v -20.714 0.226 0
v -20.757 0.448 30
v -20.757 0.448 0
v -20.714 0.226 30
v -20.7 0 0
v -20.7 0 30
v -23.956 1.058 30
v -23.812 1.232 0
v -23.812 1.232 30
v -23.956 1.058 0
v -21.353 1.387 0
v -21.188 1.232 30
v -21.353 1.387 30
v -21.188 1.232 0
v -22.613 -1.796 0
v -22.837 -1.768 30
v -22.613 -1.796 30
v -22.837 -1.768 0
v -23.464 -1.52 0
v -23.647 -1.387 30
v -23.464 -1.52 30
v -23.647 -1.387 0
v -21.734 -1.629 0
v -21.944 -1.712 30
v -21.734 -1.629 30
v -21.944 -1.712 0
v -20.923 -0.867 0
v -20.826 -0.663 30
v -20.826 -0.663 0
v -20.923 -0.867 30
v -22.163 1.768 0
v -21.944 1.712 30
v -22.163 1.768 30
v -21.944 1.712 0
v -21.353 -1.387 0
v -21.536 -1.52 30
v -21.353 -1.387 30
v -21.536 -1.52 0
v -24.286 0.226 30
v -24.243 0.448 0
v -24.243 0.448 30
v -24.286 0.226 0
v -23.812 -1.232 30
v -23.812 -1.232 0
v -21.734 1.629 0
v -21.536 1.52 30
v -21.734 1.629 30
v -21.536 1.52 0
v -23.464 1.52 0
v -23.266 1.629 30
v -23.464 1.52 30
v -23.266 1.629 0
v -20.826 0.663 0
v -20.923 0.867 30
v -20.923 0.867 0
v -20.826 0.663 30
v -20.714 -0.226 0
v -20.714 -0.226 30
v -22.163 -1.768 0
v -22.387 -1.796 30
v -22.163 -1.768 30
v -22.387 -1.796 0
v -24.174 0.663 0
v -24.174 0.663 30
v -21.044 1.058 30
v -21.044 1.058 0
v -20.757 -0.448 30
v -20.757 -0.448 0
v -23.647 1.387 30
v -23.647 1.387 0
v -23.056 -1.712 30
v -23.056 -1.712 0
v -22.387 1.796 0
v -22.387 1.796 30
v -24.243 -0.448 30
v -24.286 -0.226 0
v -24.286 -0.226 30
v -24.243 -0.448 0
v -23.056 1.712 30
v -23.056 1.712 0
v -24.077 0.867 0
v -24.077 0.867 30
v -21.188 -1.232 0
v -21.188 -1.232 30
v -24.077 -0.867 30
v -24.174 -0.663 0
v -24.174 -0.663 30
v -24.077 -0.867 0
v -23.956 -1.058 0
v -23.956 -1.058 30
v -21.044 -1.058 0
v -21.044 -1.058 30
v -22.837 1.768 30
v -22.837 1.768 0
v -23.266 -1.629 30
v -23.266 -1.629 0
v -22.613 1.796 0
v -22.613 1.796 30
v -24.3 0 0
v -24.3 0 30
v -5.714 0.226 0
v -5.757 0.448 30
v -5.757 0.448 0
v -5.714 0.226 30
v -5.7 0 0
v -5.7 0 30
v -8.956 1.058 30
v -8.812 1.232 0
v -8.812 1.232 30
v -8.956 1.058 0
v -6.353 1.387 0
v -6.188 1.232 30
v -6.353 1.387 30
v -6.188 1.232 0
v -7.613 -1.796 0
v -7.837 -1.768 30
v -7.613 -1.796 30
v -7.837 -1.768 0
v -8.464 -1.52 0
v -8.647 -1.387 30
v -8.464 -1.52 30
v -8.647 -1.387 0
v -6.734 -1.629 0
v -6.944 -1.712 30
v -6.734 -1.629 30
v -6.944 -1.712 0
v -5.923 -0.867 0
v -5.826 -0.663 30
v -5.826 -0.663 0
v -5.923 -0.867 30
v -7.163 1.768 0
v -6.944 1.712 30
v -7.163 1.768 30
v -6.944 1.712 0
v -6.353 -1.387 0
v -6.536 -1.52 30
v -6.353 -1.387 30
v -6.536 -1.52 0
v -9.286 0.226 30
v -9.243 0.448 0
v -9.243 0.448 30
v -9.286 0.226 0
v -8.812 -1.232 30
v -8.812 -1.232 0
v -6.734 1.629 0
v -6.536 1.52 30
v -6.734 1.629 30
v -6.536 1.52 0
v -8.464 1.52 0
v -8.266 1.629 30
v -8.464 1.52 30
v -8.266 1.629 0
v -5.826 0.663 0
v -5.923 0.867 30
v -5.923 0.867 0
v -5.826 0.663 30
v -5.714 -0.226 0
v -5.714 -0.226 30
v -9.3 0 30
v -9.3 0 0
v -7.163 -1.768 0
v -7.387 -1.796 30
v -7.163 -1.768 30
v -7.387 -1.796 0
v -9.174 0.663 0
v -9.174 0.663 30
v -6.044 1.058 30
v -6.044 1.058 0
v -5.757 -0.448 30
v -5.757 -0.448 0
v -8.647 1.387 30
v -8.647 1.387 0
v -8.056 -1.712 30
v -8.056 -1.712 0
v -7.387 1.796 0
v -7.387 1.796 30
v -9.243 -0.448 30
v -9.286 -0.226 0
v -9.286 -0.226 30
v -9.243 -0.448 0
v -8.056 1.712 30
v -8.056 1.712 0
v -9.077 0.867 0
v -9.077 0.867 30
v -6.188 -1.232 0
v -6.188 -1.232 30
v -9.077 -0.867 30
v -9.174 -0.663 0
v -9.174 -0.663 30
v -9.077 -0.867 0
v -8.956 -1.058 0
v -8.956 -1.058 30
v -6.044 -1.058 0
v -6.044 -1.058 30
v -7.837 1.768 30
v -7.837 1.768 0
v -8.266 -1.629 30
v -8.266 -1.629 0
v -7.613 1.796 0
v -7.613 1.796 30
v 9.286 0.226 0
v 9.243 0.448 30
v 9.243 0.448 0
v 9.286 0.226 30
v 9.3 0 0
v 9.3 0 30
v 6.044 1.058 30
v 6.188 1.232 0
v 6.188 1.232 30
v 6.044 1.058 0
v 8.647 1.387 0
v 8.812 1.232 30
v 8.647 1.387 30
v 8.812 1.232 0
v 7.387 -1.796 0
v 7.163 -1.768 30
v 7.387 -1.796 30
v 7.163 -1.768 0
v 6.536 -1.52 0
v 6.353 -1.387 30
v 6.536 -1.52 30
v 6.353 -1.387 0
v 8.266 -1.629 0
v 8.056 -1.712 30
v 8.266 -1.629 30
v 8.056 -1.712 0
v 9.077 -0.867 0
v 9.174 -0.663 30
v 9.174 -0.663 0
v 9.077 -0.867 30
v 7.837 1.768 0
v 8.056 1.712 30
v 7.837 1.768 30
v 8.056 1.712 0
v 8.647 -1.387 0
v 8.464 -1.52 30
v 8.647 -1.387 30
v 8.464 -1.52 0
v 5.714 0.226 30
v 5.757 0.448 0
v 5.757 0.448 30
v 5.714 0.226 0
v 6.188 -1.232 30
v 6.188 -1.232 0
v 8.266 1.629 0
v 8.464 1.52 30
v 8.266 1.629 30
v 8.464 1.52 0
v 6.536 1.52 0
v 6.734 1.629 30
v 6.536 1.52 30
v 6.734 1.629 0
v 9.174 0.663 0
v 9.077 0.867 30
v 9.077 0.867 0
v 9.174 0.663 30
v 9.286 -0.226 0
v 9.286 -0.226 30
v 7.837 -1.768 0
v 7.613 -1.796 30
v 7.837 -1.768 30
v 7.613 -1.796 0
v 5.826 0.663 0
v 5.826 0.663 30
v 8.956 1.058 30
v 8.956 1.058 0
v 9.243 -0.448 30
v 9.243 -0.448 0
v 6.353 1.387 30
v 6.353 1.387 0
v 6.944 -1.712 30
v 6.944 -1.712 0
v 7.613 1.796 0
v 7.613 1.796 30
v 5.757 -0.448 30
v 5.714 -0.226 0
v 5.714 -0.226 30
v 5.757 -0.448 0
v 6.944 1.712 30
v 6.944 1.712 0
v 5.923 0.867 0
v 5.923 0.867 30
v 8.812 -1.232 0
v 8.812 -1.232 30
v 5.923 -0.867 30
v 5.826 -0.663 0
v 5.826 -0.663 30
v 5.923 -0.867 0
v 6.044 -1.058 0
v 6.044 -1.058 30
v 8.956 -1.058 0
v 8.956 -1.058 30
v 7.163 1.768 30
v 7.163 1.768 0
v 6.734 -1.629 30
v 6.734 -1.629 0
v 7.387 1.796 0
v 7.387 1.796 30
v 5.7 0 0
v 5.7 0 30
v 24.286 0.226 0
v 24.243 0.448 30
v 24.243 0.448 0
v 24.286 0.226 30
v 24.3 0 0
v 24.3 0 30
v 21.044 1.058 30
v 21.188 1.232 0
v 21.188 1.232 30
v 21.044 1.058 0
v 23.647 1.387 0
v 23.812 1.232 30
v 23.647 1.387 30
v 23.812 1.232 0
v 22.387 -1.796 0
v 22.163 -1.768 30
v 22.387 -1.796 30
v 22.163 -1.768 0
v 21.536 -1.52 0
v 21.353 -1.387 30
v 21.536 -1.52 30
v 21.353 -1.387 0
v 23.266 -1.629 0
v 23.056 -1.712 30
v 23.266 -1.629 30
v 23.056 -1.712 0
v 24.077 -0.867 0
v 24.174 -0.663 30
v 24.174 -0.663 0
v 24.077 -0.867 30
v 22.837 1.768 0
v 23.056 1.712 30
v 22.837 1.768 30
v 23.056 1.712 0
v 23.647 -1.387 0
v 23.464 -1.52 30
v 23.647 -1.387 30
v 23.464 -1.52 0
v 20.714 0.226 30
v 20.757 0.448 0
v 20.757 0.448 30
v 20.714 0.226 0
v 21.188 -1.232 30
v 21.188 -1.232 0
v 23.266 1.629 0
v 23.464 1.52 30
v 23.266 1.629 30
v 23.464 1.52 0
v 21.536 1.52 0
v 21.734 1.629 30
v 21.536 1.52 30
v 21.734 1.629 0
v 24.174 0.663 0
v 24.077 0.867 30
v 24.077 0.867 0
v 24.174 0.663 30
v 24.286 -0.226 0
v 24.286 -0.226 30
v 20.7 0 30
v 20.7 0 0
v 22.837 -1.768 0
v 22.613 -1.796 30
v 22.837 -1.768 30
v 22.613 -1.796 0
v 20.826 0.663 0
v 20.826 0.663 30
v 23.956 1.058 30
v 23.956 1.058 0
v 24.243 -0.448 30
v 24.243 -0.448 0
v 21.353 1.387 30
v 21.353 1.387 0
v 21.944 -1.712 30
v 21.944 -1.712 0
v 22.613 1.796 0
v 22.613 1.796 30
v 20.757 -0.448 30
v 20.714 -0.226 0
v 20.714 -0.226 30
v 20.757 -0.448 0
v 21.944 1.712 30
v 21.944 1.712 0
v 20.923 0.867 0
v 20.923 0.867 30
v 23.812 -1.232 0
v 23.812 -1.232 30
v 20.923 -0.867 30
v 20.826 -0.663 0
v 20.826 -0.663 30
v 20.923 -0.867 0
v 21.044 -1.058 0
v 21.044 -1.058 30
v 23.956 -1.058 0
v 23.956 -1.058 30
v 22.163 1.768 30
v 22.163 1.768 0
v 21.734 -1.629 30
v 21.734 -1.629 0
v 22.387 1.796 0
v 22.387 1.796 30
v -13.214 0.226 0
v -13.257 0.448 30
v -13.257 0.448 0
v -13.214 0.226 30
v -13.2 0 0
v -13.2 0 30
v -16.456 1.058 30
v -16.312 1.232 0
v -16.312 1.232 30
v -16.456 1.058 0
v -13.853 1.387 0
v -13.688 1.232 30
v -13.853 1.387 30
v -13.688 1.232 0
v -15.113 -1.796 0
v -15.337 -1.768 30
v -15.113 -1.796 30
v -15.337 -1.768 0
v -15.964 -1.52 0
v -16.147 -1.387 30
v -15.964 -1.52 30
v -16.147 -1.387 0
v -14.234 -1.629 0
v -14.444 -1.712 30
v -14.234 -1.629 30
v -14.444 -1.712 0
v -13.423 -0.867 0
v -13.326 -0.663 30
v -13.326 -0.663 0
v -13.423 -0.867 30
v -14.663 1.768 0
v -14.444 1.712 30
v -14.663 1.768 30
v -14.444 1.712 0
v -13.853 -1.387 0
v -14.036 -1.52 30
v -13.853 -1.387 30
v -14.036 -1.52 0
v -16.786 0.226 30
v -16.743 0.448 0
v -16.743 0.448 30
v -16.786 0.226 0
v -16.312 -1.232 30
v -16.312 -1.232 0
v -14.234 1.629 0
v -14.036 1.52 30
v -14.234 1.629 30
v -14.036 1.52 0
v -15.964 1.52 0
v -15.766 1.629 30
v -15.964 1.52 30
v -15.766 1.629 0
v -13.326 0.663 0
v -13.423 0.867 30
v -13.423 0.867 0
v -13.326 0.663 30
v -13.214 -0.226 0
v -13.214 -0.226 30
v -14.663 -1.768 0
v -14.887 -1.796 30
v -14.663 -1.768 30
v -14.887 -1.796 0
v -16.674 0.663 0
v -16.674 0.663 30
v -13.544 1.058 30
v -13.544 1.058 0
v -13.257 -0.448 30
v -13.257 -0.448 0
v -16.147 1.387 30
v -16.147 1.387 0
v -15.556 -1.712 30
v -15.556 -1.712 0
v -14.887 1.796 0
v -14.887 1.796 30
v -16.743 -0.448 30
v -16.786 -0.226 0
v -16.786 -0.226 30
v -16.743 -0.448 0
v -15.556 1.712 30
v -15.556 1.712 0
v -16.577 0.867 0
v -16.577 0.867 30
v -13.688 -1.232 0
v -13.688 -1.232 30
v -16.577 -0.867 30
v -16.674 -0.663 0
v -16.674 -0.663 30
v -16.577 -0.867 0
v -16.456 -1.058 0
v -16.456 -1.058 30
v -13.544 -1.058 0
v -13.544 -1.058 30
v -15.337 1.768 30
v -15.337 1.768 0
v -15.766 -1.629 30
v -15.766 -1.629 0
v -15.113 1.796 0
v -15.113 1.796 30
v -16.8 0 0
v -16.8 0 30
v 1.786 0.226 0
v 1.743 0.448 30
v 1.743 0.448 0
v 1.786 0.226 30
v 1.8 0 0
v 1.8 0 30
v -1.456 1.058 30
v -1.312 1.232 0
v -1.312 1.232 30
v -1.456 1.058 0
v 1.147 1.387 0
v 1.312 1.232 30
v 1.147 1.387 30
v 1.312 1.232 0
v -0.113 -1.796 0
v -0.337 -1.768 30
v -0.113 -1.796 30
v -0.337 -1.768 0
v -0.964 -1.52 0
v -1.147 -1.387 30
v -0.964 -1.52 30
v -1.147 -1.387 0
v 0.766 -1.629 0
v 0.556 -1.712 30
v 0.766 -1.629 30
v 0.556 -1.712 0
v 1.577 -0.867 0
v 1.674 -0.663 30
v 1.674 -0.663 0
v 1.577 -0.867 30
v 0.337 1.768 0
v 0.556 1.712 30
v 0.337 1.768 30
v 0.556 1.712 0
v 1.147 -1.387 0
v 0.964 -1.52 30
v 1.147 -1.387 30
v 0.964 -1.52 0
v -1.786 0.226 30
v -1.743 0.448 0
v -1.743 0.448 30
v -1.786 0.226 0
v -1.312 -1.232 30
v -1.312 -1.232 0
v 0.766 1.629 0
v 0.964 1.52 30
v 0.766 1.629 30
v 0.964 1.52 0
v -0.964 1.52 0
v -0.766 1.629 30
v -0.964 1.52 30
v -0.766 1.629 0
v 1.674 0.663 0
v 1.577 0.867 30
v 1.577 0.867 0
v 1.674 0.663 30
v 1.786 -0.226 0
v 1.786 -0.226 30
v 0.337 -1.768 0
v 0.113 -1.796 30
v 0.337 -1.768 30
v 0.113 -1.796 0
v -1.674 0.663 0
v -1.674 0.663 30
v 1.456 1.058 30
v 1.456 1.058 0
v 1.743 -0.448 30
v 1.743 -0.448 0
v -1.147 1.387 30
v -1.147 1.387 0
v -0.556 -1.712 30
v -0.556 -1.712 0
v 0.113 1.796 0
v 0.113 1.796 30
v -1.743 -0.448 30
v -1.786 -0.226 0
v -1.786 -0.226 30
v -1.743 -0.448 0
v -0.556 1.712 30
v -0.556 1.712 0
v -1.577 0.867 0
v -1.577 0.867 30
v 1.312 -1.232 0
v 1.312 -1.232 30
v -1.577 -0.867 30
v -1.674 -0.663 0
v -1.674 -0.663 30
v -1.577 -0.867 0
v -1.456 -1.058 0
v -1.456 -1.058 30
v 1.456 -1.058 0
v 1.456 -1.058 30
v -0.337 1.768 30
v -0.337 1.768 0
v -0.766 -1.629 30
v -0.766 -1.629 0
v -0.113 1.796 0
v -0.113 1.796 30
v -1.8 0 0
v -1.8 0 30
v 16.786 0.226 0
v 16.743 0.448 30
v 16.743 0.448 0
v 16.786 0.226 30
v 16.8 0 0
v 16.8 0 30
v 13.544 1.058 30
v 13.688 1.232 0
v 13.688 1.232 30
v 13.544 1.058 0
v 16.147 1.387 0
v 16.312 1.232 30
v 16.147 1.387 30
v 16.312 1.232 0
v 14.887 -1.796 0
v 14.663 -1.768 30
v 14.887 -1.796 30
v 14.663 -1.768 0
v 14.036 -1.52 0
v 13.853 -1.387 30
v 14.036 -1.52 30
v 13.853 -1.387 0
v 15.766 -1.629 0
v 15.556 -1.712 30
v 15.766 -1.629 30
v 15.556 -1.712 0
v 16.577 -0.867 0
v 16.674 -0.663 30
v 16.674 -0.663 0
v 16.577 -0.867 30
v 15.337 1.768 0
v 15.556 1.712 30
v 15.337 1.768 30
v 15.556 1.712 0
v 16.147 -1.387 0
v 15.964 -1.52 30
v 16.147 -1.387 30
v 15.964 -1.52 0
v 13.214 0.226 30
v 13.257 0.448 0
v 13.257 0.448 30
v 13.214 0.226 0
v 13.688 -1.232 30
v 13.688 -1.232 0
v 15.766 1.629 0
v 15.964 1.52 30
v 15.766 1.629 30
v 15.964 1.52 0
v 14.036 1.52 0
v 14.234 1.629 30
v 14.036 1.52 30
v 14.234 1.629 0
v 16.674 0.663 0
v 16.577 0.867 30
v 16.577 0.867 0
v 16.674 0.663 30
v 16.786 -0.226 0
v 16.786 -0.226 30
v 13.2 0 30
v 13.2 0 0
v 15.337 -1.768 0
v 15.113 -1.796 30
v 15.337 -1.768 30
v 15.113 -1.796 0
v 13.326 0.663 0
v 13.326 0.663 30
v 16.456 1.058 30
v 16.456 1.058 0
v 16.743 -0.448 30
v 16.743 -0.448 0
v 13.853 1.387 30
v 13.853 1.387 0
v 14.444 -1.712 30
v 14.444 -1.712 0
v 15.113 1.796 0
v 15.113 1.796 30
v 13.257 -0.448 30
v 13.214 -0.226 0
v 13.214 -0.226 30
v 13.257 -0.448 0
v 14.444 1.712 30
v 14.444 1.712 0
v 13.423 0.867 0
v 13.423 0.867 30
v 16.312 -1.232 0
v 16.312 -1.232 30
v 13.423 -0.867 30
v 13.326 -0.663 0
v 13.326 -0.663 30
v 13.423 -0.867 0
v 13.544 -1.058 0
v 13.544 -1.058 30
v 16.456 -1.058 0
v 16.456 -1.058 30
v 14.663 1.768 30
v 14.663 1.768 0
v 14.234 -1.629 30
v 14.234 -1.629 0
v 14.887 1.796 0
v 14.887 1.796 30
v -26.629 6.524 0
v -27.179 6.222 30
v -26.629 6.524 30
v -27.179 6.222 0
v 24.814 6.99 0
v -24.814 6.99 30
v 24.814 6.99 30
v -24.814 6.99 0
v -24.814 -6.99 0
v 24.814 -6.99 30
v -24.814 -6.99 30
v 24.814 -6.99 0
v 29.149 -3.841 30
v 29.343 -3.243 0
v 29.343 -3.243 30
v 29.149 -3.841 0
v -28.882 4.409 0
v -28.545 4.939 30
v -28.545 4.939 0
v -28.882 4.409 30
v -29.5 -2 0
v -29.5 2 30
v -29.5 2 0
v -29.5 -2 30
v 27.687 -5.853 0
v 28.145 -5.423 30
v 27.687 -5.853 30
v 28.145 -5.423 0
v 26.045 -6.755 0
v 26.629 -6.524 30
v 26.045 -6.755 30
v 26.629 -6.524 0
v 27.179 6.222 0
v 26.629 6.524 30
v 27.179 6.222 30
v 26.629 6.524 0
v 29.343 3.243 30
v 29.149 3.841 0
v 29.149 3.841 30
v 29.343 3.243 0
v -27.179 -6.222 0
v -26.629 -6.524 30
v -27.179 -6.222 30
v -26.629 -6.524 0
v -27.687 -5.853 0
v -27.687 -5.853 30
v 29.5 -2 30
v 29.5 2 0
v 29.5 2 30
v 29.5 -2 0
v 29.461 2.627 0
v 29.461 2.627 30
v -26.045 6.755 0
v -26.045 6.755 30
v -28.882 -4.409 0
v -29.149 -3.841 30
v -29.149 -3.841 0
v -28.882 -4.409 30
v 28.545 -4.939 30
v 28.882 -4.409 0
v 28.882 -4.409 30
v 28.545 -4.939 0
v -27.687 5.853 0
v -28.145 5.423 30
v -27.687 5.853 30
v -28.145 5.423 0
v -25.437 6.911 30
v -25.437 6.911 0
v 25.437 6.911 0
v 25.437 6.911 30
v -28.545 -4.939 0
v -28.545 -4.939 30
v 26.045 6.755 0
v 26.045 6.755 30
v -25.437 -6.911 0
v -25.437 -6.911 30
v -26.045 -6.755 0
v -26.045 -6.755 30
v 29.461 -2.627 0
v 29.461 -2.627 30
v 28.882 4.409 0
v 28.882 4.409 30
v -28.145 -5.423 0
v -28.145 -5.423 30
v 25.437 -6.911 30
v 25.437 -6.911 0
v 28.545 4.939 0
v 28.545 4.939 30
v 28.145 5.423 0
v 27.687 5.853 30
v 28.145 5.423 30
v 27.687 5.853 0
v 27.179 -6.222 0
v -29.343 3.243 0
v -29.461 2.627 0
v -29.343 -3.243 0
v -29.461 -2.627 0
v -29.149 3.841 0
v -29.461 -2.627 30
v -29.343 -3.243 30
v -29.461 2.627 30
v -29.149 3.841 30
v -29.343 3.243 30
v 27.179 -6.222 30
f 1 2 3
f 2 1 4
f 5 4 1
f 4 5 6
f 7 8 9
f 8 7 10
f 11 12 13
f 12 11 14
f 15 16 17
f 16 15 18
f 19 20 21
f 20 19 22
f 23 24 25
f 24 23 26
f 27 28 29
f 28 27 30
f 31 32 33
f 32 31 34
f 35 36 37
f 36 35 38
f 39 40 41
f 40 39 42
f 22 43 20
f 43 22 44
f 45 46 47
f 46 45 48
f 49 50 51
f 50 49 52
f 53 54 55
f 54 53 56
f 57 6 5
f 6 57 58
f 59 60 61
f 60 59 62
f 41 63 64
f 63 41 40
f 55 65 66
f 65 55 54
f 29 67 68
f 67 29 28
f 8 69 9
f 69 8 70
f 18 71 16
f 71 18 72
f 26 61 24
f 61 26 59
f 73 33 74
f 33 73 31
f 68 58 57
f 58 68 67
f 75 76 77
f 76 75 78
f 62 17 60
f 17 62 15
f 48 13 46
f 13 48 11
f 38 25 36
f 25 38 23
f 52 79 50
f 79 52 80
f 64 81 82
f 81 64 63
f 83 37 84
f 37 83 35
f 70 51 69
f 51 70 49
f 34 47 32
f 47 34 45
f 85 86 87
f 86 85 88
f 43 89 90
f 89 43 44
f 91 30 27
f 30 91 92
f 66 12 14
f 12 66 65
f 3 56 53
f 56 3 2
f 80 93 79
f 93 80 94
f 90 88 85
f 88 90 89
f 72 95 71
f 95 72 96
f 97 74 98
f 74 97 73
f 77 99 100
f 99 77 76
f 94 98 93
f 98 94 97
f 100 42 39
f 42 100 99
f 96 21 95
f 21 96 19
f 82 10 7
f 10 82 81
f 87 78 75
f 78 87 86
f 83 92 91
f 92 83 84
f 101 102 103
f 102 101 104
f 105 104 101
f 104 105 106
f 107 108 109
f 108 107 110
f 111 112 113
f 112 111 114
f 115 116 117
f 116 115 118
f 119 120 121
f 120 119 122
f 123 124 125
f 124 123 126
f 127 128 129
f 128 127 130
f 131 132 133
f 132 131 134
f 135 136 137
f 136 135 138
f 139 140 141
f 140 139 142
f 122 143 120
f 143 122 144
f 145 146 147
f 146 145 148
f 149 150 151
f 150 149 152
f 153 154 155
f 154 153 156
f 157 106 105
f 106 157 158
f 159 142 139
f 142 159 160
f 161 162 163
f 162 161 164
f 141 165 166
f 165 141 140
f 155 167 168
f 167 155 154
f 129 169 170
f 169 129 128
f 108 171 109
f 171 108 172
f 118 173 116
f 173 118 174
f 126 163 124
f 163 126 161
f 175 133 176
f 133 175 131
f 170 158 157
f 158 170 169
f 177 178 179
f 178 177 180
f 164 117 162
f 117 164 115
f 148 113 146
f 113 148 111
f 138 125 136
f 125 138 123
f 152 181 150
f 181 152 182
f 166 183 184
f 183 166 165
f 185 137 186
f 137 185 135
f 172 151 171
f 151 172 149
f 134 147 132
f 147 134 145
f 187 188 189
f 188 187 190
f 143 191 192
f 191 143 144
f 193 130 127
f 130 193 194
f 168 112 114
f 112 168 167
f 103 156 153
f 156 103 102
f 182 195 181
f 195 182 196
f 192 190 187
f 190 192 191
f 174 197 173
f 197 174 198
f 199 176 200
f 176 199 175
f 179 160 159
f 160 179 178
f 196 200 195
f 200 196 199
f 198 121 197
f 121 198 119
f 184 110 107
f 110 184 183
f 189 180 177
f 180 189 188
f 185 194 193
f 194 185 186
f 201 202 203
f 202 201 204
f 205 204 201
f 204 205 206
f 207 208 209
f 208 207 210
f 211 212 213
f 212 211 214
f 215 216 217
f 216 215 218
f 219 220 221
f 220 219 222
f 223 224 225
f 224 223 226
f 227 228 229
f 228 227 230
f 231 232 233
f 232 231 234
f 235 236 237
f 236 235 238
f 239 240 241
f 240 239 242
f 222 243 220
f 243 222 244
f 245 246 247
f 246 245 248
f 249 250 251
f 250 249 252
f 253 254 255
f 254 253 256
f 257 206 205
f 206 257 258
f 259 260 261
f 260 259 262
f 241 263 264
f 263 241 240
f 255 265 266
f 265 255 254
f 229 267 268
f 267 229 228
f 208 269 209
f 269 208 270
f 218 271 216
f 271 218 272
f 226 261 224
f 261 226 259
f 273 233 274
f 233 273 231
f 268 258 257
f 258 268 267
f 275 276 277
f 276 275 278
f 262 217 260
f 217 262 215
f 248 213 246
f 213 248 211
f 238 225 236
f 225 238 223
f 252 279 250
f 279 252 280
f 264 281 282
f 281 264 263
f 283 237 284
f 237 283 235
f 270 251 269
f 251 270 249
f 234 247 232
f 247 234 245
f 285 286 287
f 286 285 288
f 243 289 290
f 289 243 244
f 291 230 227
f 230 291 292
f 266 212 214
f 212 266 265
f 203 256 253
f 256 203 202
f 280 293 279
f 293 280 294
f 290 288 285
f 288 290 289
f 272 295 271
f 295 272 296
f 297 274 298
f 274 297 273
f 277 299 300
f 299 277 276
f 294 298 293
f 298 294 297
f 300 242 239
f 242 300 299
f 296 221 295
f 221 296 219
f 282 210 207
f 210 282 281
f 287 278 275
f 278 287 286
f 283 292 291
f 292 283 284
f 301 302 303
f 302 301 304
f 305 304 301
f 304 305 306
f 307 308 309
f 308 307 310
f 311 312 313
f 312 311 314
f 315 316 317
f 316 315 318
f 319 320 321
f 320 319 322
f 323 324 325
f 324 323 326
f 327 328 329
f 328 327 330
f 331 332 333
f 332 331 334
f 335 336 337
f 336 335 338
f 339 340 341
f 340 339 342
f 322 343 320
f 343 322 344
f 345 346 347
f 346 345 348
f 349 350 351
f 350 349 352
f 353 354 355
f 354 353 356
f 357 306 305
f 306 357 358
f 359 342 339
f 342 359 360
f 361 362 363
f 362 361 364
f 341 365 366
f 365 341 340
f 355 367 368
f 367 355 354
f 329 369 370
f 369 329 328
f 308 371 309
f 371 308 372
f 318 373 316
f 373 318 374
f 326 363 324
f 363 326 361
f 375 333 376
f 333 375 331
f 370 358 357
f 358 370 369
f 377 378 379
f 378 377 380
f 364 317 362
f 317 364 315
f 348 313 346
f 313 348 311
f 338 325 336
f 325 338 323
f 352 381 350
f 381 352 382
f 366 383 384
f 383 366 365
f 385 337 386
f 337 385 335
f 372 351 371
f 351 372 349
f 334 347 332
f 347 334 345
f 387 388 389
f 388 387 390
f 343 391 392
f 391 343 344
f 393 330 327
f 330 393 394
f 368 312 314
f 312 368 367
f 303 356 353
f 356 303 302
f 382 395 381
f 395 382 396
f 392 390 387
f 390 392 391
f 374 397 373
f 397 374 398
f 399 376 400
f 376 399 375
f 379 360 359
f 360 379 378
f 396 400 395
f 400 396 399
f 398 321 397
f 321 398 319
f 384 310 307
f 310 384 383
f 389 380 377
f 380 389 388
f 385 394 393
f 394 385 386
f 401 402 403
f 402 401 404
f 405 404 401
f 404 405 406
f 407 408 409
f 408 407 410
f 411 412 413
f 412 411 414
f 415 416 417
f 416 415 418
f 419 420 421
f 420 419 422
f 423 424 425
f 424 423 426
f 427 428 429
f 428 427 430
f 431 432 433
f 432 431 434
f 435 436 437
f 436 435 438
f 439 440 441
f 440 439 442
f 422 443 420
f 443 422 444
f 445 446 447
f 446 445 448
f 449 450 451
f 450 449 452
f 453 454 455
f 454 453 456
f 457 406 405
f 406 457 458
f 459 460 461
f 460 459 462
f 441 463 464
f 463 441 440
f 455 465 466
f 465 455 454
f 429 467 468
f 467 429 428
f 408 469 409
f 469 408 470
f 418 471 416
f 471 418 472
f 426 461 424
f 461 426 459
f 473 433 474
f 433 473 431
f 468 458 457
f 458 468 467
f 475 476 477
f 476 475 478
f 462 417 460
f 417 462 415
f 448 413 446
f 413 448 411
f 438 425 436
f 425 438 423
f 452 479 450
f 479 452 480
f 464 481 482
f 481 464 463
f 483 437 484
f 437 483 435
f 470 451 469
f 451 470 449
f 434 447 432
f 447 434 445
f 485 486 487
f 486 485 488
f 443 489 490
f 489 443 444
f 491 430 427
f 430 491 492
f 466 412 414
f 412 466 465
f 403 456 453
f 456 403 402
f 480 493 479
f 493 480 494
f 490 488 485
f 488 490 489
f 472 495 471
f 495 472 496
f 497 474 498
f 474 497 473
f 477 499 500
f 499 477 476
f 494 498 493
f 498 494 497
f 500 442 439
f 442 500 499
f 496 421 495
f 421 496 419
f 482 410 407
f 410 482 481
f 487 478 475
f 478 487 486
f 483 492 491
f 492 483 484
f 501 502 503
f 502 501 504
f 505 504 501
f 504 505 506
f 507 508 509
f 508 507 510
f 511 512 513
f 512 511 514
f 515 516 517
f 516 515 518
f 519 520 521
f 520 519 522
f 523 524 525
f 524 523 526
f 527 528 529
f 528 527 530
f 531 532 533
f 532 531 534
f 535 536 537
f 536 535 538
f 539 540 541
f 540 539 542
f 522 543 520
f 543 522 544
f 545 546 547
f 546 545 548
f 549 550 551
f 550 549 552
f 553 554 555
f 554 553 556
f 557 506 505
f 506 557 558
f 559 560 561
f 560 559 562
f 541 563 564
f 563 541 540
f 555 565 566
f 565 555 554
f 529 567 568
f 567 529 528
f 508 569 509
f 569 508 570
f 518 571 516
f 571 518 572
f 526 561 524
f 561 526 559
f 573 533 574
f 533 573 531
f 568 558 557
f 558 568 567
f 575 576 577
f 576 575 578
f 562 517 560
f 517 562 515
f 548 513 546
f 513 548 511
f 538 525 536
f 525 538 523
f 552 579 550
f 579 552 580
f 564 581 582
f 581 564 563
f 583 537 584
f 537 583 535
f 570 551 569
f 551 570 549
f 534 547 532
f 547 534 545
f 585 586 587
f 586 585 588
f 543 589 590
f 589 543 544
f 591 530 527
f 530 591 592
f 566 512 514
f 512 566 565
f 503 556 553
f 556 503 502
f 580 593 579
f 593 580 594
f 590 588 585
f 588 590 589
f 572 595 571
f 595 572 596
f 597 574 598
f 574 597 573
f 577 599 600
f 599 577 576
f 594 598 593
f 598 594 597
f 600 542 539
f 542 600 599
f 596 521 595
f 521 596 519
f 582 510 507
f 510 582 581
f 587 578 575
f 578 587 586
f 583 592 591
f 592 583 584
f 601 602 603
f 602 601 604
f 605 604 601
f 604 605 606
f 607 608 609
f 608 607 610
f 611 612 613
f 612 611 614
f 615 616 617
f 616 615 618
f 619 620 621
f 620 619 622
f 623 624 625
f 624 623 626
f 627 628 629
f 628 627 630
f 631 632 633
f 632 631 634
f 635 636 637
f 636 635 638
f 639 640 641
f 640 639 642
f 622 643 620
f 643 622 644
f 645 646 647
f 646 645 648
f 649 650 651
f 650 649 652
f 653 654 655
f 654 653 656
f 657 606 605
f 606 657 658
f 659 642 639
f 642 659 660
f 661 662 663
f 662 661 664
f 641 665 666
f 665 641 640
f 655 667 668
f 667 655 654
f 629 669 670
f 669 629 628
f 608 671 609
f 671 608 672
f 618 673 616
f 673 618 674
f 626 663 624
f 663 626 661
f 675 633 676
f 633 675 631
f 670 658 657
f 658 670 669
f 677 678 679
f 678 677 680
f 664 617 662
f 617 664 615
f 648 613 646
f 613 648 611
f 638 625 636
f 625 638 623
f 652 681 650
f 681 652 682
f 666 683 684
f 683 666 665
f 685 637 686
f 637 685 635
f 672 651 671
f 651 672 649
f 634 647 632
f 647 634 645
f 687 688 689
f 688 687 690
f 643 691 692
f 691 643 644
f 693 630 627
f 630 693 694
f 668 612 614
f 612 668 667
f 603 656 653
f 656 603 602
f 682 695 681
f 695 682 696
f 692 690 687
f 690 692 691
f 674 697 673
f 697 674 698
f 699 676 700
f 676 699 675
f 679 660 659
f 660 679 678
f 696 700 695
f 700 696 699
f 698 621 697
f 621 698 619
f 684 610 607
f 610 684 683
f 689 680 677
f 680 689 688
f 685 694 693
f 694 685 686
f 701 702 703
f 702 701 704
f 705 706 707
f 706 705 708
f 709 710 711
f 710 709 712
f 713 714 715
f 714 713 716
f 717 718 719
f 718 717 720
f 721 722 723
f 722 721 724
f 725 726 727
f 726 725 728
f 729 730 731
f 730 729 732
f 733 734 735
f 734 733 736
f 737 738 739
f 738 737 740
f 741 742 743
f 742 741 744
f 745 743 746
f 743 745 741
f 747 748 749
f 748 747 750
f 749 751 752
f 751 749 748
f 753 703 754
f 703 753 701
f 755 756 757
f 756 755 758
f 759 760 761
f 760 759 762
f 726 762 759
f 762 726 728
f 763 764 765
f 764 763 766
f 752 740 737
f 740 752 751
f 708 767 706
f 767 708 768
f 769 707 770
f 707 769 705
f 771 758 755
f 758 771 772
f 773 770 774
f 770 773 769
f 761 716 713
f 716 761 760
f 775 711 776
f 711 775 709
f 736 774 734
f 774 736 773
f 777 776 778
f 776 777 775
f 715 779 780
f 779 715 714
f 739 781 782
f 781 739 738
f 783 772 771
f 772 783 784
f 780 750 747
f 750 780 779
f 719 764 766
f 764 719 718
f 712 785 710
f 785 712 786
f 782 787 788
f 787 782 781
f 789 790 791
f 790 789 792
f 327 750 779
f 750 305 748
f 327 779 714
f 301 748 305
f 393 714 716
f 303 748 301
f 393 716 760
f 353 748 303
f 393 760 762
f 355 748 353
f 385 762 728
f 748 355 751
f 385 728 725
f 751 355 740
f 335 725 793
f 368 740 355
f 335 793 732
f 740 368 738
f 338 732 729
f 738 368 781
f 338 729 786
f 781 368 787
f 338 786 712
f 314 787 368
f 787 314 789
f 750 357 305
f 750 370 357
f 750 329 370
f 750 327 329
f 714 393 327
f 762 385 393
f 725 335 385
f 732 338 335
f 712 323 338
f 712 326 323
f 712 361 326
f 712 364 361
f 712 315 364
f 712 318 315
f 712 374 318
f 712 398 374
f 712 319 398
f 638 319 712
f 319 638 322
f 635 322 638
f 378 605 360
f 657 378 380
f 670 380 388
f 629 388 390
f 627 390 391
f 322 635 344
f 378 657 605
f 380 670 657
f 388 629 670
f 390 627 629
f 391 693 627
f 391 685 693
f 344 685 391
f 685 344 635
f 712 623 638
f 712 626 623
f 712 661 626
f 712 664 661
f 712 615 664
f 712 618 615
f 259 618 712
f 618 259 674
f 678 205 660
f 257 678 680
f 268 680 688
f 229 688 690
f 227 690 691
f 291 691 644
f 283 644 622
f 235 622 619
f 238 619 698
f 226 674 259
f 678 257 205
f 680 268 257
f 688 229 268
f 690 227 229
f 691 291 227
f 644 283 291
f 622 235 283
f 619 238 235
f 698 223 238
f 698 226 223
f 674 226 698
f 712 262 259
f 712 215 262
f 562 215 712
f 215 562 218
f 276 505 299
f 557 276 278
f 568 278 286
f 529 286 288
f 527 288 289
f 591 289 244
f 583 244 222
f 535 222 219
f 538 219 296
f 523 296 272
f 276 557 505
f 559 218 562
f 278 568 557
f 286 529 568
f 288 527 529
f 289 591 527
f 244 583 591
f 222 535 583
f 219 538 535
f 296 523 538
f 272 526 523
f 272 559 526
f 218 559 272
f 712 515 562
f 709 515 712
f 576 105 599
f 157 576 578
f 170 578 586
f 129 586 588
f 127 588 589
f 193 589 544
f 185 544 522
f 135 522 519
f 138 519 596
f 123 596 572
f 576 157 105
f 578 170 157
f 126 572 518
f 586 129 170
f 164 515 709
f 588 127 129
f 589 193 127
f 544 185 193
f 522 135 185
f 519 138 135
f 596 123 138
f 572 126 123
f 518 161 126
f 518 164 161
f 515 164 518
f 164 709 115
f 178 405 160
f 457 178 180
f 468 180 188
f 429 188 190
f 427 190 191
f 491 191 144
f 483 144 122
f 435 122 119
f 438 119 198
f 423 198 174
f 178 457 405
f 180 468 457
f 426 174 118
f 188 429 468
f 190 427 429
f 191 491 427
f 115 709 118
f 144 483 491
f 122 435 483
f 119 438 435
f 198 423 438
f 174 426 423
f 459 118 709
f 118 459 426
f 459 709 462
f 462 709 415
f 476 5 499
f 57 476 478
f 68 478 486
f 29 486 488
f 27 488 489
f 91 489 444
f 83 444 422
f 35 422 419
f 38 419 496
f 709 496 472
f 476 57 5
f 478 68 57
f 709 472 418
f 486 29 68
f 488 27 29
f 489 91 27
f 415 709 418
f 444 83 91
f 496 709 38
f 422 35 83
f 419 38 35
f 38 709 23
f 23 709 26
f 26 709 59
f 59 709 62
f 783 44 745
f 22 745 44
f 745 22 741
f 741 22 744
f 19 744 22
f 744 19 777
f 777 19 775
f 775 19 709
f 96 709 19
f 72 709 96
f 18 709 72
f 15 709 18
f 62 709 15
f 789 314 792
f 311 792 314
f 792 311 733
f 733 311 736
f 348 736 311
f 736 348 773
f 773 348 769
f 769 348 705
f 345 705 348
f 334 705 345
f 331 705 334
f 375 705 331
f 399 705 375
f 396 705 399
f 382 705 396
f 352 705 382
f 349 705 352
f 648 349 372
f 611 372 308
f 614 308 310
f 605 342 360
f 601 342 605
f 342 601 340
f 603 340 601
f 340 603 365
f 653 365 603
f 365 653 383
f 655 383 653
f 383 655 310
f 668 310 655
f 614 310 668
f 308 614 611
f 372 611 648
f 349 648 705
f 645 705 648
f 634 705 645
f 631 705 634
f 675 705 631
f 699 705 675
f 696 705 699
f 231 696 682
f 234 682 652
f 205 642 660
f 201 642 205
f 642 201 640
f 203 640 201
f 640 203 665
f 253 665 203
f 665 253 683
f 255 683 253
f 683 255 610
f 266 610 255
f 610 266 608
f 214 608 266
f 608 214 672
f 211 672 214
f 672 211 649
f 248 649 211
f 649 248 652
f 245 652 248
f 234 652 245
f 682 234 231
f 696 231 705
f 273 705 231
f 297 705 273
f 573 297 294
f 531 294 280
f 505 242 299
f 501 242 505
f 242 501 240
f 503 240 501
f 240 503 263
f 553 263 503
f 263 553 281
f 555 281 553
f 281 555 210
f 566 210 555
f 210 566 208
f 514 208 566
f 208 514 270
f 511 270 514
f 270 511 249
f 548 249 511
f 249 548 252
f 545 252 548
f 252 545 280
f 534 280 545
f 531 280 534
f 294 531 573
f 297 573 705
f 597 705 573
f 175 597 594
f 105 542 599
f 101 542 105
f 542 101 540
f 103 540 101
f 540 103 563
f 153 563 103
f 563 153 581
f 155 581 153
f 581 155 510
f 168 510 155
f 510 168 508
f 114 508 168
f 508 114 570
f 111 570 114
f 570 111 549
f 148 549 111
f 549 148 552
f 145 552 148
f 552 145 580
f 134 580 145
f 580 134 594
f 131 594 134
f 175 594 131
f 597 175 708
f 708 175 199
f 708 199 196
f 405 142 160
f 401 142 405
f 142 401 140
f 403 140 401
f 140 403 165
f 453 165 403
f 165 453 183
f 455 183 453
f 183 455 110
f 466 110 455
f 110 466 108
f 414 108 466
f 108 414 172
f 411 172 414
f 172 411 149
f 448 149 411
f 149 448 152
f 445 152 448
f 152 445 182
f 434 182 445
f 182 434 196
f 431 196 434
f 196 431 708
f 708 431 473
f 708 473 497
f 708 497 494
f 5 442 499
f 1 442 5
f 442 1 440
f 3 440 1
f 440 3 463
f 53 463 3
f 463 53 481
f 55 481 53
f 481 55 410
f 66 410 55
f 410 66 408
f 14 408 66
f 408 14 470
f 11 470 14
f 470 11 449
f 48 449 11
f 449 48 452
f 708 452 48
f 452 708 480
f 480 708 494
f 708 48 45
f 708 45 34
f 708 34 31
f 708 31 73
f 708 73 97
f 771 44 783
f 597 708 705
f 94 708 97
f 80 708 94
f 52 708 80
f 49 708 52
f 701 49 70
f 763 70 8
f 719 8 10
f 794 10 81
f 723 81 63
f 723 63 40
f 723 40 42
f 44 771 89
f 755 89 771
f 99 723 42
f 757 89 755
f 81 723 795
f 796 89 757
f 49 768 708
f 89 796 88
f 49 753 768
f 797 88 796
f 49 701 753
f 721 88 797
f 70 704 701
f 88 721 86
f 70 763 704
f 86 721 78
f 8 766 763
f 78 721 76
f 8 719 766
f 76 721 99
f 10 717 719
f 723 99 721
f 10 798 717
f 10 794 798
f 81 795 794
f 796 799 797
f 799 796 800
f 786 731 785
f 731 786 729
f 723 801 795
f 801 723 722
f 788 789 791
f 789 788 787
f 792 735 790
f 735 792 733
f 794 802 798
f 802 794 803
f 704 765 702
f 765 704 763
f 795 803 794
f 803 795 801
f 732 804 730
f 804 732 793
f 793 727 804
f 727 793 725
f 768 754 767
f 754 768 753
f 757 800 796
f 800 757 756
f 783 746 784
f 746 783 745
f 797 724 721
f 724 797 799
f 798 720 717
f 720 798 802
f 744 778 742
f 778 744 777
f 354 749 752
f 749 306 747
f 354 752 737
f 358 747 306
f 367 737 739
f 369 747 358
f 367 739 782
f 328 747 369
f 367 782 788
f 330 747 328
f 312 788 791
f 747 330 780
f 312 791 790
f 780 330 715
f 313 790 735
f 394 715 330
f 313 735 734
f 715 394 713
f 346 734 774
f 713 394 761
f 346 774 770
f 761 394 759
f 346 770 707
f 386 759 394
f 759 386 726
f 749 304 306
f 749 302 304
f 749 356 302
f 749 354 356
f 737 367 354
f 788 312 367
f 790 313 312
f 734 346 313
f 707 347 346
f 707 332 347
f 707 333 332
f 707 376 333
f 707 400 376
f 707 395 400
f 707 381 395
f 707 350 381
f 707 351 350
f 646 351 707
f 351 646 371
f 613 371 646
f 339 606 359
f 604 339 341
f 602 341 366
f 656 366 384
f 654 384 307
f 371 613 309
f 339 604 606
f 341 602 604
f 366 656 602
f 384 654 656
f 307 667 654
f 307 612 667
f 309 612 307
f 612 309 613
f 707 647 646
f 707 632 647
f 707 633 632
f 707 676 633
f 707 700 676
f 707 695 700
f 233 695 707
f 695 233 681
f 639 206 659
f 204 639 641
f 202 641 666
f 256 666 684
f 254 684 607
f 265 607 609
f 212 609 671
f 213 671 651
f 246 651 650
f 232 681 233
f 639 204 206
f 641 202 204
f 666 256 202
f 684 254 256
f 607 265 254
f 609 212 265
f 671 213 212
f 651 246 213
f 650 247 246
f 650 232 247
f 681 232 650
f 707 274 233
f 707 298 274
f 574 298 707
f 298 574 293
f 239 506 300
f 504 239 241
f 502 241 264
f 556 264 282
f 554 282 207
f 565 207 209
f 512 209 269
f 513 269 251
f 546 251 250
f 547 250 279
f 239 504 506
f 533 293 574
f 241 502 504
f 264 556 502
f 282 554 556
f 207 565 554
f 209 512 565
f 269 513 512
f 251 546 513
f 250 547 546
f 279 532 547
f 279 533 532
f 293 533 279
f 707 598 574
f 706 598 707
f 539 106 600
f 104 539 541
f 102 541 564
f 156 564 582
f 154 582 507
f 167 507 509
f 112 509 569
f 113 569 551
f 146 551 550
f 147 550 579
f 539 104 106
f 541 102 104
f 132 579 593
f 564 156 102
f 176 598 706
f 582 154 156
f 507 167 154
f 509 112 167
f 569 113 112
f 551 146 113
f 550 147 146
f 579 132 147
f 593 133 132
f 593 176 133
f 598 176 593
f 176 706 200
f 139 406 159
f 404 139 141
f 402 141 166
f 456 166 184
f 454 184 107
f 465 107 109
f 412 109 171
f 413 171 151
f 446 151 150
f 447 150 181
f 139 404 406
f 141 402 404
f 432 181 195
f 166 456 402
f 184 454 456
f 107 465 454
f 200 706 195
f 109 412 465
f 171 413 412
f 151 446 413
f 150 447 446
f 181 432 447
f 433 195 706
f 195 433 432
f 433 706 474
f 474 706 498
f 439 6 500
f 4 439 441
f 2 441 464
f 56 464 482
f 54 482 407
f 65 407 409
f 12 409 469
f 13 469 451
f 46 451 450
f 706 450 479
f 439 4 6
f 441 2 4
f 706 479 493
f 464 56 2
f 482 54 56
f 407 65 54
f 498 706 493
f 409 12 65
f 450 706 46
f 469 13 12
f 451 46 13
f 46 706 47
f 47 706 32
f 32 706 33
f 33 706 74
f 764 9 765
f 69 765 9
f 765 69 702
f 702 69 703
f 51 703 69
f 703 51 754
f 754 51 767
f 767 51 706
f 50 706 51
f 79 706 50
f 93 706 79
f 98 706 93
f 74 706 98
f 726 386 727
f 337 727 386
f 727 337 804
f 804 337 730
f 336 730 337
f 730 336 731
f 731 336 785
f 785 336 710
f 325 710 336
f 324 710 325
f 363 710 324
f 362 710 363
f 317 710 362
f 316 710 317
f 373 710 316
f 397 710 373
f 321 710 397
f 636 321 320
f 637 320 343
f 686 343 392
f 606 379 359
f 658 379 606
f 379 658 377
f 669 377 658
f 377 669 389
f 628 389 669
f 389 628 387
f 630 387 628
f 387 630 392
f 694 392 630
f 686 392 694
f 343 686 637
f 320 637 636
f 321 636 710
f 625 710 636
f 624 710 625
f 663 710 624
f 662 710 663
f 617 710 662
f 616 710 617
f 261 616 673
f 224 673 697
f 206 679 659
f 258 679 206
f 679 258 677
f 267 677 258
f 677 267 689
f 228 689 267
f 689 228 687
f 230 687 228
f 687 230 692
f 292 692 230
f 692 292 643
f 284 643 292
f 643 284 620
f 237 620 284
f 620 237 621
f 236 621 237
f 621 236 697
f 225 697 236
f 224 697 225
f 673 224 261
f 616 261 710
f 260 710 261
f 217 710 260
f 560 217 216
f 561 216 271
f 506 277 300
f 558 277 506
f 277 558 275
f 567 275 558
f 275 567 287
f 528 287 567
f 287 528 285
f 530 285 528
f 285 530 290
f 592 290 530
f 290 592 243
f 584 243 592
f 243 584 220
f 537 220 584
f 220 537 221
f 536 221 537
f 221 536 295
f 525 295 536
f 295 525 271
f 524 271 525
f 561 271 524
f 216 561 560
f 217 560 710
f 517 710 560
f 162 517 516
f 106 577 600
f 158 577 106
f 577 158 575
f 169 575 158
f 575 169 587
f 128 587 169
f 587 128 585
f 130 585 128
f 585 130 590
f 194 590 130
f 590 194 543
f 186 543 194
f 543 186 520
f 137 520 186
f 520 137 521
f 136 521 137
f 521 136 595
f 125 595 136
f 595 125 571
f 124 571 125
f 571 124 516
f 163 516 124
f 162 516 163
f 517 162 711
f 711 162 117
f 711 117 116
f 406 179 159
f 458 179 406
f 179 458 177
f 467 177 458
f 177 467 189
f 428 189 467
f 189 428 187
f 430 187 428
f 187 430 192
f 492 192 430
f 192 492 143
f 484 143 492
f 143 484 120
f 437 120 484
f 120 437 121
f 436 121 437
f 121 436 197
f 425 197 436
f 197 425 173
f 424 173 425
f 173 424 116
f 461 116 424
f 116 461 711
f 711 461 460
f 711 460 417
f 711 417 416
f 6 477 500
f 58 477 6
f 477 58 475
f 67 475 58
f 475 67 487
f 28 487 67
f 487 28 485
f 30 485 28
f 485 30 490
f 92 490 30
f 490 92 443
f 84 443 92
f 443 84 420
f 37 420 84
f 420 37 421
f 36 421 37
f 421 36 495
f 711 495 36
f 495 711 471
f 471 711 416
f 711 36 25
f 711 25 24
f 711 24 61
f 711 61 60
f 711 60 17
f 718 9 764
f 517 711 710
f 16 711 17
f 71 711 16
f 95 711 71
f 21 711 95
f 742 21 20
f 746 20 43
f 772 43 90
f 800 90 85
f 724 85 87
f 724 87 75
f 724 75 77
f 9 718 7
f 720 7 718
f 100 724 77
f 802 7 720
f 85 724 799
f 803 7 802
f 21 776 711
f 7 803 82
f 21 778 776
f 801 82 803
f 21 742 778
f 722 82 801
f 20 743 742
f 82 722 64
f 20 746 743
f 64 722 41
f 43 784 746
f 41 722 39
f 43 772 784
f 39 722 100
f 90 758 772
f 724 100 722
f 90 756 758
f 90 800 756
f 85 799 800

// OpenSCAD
$fn = 50;


difference() {
	union() {
		hull() {
			translate(v = [-24.5000000000, 2.0000000000, 0]) {
				cylinder(h = 30, r = 5);
			}
			translate(v = [24.5000000000, 2.0000000000, 0]) {
				cylinder(h = 30, r = 5);
			}
			translate(v = [-24.5000000000, -2.0000000000, 0]) {
				cylinder(h = 30, r = 5);
			}
			translate(v = [24.5000000000, -2.0000000000, 0]) {
				cylinder(h = 30, r = 5);
			}
		}
	}
	union() {
		translate(v = [-22.5000000000, 0.0000000000, 0]) {
			translate(v = [0, 0, -100]) {
				cylinder(h = 200, r = 1.8000000000);
			}
		}
		translate(v = [-7.5000000000, 0.0000000000, 0]) {
			translate(v = [0, 0, -100]) {
				cylinder(h = 200, r = 1.8000000000);
			}
		}
		translate(v = [7.5000000000, 0.0000000000, 0]) {
			translate(v = [0, 0, -100]) {
				cylinder(h = 200, r = 1.8000000000);
			}
		}
		translate(v = [22.5000000000, 0.0000000000, 0]) {
			translate(v = [0, 0, -100]) {
				cylinder(h = 200, r = 1.8000000000);
			}
		}
		translate(v = [-22.5000000000, 0.0000000000, 0]) {
			translate(v = [0, 0, -100]) {
				cylinder(h = 200, r = 1.8000000000);
			}
		}
		translate(v = [-15.0000000000, 0.0000000000, 0]) {
			translate(v = [0, 0, -100]) {
				cylinder(h = 200, r = 1.8000000000);
			}
		}
		translate(v = [-7.5000000000, 0.0000000000, 0]) {
			translate(v = [0, 0, -100]) {
				cylinder(h = 200, r = 1.8000000000);
			}
		}
		translate(v = [0, 0, -100]) {
			cylinder(h = 200, r = 1.8000000000);
		}
		translate(v = [7.5000000000, 0.0000000000, 0]) {
			translate(v = [0, 0, -100]) {
				cylinder(h = 200, r = 1.8000000000);
			}
		}
		translate(v = [15.0000000000, 0.0000000000, 0]) {
			translate(v = [0, 0, -100]) {
				cylinder(h = 200, r = 1.8000000000);
			}
		}
		translate(v = [22.5000000000, 0.0000000000, 0]) {
			translate(v = [0, 0, -100]) {
				cylinder(h = 200, r = 1.8000000000);
			}
		}
	}
}
